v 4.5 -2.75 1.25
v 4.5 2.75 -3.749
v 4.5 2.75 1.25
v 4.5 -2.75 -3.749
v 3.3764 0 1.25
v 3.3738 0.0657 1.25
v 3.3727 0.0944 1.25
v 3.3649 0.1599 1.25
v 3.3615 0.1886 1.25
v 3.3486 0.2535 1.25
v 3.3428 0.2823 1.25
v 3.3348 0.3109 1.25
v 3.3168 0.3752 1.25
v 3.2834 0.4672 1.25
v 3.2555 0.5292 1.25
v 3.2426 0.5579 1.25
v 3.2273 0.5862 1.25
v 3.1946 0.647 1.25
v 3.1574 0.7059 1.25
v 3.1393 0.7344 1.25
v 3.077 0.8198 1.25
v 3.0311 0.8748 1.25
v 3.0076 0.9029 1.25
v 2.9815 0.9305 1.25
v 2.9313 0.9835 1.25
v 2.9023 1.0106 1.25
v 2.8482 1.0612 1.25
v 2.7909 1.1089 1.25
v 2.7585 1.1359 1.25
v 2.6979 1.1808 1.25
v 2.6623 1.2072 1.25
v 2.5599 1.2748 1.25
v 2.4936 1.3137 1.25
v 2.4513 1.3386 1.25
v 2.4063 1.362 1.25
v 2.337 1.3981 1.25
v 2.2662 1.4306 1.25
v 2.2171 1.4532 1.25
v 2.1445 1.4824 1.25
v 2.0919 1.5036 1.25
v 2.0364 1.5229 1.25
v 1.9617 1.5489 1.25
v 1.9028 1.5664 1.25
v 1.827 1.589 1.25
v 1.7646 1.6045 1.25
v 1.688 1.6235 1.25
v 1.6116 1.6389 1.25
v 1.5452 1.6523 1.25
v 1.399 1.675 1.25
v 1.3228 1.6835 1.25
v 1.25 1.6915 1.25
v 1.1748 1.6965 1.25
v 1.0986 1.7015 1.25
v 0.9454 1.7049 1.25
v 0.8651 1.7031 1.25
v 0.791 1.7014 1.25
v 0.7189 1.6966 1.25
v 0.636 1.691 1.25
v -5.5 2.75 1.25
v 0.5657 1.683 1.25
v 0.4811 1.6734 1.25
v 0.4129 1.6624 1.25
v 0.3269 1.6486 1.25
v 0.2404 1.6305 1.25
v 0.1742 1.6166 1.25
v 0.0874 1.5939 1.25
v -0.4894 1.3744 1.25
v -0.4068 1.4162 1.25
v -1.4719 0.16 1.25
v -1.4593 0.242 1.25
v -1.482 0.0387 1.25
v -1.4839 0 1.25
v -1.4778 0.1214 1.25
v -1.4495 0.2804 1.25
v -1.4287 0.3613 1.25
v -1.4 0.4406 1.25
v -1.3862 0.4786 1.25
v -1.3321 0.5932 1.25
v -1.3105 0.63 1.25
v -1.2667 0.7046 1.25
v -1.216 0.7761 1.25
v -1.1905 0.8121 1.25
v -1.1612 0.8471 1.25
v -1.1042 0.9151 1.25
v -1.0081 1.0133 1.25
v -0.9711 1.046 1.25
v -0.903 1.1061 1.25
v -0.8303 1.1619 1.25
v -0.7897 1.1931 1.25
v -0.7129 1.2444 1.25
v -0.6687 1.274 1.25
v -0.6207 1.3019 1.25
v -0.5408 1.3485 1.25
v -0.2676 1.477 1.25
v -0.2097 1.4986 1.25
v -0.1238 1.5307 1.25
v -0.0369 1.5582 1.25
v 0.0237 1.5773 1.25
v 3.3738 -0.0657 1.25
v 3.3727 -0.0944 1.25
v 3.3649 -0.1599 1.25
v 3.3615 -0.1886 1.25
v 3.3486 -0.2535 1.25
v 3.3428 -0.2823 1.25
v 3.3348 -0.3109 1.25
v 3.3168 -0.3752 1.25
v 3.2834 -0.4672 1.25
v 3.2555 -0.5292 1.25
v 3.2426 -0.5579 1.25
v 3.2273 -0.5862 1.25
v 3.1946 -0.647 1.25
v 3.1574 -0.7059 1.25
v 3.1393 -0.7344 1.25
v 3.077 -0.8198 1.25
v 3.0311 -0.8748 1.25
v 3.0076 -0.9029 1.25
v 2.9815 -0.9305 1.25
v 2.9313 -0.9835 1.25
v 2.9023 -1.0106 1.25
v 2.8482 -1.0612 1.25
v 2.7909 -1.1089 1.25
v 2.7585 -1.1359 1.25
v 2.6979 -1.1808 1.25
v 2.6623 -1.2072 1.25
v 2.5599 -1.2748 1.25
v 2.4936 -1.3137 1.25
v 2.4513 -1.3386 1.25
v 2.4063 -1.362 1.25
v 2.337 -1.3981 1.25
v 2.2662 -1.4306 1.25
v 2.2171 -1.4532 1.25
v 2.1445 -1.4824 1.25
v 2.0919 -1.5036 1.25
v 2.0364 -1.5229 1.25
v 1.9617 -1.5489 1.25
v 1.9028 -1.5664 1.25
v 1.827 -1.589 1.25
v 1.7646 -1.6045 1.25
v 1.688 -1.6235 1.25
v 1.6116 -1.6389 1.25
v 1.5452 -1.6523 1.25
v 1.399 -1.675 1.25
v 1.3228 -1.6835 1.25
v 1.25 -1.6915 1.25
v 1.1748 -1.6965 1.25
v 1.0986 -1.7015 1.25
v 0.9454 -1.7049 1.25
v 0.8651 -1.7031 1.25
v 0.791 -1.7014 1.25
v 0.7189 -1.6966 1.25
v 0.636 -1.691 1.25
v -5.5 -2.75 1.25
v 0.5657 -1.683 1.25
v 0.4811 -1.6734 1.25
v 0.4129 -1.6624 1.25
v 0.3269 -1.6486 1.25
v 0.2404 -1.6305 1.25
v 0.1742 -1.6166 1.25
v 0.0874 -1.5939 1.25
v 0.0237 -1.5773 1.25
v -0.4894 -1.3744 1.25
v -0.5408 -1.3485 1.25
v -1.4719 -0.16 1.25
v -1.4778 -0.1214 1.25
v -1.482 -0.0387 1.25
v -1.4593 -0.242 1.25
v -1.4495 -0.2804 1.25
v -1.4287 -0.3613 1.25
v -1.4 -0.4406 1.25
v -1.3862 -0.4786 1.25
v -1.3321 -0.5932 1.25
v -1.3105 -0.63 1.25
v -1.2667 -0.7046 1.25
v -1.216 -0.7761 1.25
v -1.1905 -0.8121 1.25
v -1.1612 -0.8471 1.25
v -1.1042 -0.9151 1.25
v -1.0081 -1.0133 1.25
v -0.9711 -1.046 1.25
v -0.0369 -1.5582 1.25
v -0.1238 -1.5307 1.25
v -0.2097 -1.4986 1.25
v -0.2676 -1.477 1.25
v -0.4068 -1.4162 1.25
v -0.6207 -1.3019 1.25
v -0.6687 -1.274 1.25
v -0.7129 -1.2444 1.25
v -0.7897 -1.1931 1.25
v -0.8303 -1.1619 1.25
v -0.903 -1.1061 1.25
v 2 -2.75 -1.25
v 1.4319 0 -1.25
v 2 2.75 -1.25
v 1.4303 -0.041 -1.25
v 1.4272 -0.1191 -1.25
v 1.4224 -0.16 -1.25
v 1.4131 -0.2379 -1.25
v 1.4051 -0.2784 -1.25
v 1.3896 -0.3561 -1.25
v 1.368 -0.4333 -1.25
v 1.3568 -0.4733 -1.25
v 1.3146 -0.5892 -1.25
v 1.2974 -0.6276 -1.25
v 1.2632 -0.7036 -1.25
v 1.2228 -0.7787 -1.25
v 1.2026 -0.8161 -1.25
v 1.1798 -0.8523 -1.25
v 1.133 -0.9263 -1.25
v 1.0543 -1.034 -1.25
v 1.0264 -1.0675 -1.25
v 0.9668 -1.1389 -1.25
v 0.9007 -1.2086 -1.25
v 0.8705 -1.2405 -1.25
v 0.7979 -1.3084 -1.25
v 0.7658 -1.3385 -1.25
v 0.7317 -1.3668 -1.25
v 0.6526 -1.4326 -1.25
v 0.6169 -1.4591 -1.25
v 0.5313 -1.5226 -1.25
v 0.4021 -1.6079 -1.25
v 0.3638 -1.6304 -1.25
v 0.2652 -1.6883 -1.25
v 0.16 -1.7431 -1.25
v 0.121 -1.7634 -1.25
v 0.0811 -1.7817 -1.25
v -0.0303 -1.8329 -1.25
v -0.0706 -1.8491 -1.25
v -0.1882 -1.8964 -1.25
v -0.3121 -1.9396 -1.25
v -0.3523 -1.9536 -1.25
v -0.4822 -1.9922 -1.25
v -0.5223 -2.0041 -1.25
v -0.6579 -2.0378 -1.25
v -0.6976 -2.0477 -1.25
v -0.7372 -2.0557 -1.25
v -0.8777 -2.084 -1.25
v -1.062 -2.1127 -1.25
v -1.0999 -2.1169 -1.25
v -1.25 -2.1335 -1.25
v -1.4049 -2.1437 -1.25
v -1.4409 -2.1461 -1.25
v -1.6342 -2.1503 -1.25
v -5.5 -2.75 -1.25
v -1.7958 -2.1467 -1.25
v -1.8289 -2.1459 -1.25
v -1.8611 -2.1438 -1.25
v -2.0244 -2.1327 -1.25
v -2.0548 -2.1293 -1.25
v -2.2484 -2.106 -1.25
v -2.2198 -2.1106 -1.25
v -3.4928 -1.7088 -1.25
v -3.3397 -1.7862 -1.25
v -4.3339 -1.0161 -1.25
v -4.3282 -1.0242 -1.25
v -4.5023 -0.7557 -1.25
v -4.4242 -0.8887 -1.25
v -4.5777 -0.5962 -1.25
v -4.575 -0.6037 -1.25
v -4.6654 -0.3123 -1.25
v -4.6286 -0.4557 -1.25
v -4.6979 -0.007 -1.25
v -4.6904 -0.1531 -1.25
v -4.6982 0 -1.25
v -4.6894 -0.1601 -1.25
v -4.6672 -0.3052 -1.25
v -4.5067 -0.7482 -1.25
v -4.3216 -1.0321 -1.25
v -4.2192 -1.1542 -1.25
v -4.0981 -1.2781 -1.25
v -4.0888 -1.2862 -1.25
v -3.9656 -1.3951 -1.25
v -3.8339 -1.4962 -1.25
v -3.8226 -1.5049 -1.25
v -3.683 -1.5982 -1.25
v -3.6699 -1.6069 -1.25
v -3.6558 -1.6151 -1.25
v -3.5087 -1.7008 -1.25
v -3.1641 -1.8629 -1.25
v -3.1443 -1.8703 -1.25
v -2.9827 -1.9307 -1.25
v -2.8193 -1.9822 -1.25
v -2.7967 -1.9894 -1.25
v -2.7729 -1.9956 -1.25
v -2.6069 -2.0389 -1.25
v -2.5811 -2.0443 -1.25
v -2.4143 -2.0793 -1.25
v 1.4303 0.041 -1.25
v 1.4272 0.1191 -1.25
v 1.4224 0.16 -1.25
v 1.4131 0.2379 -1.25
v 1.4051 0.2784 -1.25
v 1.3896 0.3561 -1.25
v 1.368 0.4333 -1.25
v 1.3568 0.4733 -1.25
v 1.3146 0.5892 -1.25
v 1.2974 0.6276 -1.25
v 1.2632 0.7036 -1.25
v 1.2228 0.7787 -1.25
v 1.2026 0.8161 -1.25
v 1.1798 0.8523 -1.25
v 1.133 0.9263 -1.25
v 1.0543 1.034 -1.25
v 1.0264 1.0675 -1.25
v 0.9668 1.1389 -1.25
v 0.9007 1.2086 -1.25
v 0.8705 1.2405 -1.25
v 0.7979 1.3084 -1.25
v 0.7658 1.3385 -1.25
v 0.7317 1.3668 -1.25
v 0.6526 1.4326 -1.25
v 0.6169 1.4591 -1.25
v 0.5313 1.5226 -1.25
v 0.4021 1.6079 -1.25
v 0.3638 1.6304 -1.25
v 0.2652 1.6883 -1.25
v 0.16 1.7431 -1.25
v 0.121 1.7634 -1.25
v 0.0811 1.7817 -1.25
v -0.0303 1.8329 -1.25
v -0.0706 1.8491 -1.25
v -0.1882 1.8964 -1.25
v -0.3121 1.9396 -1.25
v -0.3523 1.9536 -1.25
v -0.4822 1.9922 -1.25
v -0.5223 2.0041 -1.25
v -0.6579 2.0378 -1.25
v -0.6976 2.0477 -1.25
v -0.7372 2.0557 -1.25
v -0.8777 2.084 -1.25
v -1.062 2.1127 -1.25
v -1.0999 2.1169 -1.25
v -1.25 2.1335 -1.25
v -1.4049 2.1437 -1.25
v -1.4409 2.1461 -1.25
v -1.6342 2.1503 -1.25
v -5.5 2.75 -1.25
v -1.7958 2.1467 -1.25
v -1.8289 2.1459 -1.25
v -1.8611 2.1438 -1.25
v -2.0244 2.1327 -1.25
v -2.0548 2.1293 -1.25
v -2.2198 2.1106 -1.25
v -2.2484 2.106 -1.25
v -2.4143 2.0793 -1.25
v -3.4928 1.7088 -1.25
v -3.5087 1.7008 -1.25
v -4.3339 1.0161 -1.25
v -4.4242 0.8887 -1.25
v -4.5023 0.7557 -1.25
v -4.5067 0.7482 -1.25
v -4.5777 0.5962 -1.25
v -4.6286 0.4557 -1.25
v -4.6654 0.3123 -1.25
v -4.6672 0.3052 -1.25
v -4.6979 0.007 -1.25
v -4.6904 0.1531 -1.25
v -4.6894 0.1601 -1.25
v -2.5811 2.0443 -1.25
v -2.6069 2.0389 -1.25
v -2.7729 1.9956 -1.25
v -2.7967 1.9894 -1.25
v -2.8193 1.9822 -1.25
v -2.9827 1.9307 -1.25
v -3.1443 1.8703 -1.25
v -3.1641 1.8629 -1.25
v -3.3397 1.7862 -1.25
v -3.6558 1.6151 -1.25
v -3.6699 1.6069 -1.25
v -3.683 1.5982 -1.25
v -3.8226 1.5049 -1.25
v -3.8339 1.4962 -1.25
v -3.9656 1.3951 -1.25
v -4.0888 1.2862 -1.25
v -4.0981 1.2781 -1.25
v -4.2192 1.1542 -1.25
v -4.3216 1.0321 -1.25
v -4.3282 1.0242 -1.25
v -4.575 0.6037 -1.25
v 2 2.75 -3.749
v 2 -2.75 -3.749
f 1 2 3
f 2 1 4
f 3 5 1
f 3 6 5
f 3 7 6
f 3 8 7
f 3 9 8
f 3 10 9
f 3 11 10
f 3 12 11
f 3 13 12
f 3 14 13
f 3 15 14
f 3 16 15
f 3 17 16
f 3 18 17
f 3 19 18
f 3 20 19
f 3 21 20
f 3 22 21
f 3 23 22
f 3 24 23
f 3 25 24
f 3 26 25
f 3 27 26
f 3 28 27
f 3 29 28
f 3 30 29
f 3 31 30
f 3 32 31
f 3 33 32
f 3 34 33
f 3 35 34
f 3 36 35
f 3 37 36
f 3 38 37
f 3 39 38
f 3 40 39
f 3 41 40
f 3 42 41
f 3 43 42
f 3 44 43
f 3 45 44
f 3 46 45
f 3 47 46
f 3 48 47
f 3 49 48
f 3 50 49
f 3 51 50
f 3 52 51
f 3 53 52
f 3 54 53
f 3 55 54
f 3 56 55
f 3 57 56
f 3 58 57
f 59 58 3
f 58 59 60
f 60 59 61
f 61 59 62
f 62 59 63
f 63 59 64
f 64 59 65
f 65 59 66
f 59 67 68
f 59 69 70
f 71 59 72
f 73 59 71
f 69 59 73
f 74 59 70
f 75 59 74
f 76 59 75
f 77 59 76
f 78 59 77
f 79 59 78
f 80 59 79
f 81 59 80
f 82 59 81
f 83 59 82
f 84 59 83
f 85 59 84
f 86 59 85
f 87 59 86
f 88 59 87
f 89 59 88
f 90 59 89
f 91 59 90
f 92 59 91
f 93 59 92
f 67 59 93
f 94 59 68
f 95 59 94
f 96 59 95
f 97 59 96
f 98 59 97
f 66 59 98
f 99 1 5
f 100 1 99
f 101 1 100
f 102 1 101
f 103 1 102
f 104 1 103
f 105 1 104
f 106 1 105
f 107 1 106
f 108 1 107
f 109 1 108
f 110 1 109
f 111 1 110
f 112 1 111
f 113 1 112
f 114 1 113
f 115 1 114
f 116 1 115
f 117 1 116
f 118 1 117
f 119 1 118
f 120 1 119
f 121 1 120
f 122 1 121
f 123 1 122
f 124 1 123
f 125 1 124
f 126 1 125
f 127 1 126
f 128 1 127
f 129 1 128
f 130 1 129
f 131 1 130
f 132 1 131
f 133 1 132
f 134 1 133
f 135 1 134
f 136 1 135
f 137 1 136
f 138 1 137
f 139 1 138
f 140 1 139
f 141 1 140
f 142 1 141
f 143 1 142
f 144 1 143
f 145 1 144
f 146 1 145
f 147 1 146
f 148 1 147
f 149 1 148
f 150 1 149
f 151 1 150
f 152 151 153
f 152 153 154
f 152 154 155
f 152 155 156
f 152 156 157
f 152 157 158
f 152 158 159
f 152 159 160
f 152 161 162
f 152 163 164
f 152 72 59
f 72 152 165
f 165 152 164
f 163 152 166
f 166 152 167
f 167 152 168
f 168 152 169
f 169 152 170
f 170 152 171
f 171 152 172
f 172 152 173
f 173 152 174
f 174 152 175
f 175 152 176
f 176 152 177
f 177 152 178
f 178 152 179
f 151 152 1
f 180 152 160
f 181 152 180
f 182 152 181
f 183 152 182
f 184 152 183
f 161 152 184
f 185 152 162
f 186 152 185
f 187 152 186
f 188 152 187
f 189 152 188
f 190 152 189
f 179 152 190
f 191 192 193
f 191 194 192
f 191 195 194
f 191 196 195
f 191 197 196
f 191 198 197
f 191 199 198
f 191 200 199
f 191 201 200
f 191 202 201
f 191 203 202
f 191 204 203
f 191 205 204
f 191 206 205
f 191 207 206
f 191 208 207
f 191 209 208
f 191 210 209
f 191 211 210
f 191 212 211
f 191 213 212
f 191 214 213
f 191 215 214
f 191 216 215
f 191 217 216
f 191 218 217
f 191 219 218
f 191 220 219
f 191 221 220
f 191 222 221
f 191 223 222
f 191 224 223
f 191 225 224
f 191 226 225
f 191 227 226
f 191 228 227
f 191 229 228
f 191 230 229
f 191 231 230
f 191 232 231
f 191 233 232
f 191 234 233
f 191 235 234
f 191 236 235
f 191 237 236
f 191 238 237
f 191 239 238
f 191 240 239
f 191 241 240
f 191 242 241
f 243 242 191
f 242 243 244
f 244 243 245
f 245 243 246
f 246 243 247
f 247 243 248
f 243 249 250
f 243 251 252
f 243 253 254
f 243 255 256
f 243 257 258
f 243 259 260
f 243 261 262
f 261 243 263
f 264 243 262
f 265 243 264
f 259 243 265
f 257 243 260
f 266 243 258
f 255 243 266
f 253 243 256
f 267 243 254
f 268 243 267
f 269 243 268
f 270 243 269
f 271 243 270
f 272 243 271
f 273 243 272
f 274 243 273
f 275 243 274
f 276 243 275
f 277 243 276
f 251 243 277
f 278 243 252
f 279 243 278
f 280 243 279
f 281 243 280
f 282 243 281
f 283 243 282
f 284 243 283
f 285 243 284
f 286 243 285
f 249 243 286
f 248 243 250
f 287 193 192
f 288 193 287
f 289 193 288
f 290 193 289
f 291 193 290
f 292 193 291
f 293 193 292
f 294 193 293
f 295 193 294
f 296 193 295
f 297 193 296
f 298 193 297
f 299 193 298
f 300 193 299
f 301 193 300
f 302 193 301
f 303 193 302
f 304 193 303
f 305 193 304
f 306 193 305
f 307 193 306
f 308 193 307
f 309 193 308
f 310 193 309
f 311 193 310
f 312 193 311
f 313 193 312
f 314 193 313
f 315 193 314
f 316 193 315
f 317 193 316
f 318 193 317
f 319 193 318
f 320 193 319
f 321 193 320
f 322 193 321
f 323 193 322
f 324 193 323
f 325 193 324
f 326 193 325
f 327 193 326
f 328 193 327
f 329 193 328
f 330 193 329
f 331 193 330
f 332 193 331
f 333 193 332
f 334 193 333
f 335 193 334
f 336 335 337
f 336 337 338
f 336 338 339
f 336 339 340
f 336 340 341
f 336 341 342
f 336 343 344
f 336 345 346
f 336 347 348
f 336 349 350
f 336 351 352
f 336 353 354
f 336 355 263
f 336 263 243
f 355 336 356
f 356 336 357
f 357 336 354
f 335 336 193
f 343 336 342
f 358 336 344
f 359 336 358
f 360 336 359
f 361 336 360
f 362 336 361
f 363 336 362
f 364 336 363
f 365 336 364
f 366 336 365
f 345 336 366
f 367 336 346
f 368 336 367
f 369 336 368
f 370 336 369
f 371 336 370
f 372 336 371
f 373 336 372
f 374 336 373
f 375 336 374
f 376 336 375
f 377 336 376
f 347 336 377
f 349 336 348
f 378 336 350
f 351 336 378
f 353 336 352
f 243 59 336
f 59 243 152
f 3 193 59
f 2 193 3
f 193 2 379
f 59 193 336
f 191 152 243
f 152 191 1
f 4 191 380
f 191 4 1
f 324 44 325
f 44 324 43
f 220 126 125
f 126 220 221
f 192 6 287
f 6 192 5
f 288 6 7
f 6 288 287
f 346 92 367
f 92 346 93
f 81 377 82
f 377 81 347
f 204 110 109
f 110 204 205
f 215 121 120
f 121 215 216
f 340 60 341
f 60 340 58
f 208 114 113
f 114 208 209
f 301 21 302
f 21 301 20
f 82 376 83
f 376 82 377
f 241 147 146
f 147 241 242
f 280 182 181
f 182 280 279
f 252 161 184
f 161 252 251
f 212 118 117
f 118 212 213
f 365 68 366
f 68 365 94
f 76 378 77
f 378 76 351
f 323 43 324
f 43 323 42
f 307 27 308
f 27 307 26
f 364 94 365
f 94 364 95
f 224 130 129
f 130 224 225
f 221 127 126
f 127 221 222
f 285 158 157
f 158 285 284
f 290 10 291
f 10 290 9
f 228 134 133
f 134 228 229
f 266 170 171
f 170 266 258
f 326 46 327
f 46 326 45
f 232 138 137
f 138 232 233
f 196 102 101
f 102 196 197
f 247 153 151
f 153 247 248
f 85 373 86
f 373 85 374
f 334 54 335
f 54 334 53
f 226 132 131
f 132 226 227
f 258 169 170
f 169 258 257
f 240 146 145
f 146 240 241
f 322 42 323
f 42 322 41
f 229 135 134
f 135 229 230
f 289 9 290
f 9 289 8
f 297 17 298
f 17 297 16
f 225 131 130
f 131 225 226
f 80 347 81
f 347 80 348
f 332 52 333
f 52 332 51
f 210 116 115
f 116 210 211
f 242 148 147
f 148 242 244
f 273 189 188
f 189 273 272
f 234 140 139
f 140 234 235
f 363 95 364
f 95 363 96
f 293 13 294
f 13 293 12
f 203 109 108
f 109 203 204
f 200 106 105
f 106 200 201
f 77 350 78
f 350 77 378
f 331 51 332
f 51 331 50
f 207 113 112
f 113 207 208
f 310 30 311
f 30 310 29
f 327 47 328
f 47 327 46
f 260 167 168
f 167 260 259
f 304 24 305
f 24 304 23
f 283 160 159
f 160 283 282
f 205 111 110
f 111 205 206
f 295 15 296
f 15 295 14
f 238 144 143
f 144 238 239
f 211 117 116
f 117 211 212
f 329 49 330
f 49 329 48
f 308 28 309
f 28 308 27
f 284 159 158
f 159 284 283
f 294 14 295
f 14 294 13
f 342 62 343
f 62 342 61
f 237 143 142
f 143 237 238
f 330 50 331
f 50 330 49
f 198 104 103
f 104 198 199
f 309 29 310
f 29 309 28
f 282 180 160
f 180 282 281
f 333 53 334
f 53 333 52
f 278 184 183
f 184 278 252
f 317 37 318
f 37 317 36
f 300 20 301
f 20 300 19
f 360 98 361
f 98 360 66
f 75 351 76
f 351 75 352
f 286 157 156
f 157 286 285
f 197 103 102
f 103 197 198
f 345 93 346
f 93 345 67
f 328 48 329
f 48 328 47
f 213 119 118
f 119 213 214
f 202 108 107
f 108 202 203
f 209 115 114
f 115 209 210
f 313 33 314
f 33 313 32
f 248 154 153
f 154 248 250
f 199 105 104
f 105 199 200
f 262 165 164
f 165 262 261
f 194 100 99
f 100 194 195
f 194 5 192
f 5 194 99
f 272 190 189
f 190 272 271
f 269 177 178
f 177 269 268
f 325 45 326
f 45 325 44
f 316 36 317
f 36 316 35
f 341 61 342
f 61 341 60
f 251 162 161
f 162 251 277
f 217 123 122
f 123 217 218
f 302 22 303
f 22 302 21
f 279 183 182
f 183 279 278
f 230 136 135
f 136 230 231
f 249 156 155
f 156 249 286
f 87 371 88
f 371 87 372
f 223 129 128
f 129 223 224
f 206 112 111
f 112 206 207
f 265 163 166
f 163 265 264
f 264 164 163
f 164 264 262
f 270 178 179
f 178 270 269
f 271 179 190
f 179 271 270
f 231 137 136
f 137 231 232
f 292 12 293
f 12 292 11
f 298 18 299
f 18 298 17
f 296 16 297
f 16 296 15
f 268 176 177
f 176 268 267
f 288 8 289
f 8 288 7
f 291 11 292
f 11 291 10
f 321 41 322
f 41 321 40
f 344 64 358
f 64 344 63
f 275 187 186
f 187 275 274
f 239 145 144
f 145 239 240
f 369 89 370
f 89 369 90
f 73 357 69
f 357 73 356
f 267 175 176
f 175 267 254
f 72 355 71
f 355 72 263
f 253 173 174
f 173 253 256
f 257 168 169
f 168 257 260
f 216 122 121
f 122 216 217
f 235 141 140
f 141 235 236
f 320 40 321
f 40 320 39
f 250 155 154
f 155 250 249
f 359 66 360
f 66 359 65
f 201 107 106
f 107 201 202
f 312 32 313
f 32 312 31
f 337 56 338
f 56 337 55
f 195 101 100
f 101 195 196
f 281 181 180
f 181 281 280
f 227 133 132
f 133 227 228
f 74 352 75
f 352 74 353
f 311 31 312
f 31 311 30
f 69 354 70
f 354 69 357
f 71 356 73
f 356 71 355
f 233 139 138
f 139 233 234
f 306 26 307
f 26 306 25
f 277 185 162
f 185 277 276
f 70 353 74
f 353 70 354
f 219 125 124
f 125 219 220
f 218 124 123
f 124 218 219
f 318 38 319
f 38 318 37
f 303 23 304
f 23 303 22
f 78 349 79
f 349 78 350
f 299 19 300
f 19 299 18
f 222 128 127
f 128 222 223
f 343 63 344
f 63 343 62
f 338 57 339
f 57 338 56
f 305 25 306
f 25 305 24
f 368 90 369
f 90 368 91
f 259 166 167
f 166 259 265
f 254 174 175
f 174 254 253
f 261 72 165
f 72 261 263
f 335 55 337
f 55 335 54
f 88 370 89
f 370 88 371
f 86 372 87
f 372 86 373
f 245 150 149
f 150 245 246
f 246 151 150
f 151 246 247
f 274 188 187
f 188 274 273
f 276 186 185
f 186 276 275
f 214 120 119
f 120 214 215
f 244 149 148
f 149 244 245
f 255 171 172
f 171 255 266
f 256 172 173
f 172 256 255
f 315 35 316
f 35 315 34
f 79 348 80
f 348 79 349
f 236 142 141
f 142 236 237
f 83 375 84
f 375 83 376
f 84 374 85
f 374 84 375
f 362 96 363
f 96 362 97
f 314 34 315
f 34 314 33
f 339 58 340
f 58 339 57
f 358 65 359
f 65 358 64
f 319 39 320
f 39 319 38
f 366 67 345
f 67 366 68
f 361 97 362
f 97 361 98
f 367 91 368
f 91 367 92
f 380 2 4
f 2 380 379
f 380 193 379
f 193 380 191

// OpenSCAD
// file: utils.scad
//-- General parts
//-- Ariel Burman
//-- Moorman Lab, University of Massachusetts Amherst
//-- v1.2 - April 2021


module screwM3(length,show=false){
  translate([0,0,-length-.005])cylinder(h=length+.1+.005,d=3.4,$fn=64);
  cylinder(h=3,d=5.5,$fn=64);
  if (show==true) {
    %translate([0,0,-length])cylinder(h=length,d=3.2,$fn=64);
    %cylinder(h=3,d=5.5,$fn=64);
    echo(str("M3 screw lenght: ", length, " mm"));
  }
}

module nutM3(rotation=0,show=false) {
  rotate([0,0,rotation])cylinder(h=2.6+.01,d=6.5,$fn=6,center=true);
  if (show==true) {
    %difference(){
      rotate([0,0,rotation])cylinder(h=2.6,d=6.4,$fn=6,center=true);
      cylinder(h=3,d=3.5,$fn=64,center=true);
    }
  }
}

module torus(d1,d2,fn=64){
  assert (d1<=d2, str("ERROR d1 must not be greater than d2. d1 = ",d1,"| d2 = ",d2));
  rotate_extrude(convexity = 10,$fn=fn)
  translate([d2/2, 0, 0])
  circle(d=d1, $fn=fn);
}


module rrect(size,center=false,fn=64){

  dx = size[0];
  dy = size[1];
  dz = size[2];
  
  module _rrect(size,fn){
    d = min(dx,dy);
    a = (d == dx ? 0 : 1);
    
    hull()
      for(i=[-1,1]) 
        translate([a*i*(dx-d)/2,(1-a)*i*(dy-d)/2,0])
             cylinder(h=dz,d=d,$fn=fn,center=true);
  }
  
  if (center==true)
    _rrect(size,fn);
  else
    translate([dx/2,dy/2,dz/2]) _rrect(size,fn);
  
}  

module r2cube(size,center=false,r=0,fn=64){

  module _r2cube(size,r,fn){
    
    hull()
      for(i=[-1,1]) 
        translate([i*(dx/2-r),0,0])
          rrect([2*r,dy,dz],$fn=fn,center=true);

//    hull(){
//      for(i=[-1,1]) 
//        translate([i*(dx/2-r),0,0])
//          hull(){
//            for(j=[-1,1])
//              translate([0,j*(dy/2-r),0])
//                cylinder(h=dz,r=r,$fn=fn,center=true);
//          }
//    }

//    hull()
//      for(i=[-1,1]) 
//        for(j=[-1,1])
//          translate([i*(dx/2-r),j*(dy/2-r),0])
//            cylinder(h=dz,r=r,$fn=fn,center=true);
    
  }

  dx = size[0];
  dy = size[1];
  dz = size[2];

  assert(r>0,"Corner radius must be grater than 0 (otherwise just use cube)");
  assert(r<=min(dx,dy)/2,"Corner radius must not be greater than min(x,y)/2");

  if (center==true)
    _r2cube(size,r,fn);
  else
    translate([dx/2,dy/2,dz/2]) _r2cube(size,r,fn);
}


module rcylinder(h,r,rb,center=false,fn=64){
  module _rcylinder(h,r,rb,fn){
    hull(){
      translate([0,0,-h/2+rb/2])torus(rb,2*r-rb,fn);
      translate([0,0,h/2-rb/2])torus(rb,2*r-rb,fn);
    }
  }
  if (center==true)
    _rcylinder(h,r,rb,fn);
  else
    translate([0,0,h/2])_rcylinder(h,r,rb,fn);
}

module rhcylinder(h,rout,rin,rb,center=false,fn=64){
  //rounded hollow cylinder
  module _rhcylinder(h,rout,rin,rb,fn){
    difference(){
      union(){
      cylinder(h=h,d=2*rout-rb,$fn=fn,center=true);
      cylinder(h=h-rb,d=2*rout,$fn=fn,center=true);
      }
      cylinder(h=h-rb,d=2*rin,$fn=fn,center=true);
      translate([0,0,h/2])cylinder(h=rb+.1,d=2*rin+rb,$fn=fn,center=true);
      translate([0,0,-h/2])cylinder(h=rb+.1,d=2*rin+rb,$fn=fn,center=true);
    }
    translate([0,0,-h/2+rb/2])torus(rb,2*rout-rb,fn);
    translate([0,0,h/2-rb/2])torus(rb,2*rout-rb,fn);
    translate([0,0,-h/2+rb/2])torus(rb,2*rin+rb,fn);
    translate([0,0,h/2-rb/2])torus(rb,2*rin+rb,fn);
  }
  
  //do assertions
  assert(rout>rin);
  assert(rb<=(rout-rin));
  assert(h>=rb);

  if (center==true)
    _rhcylinder(h,rout,rin,rb,fn);
  else
    translate([0,0,h/2])_rhcylinder(h,rout,rin,rb,fn);
}

module r3cube(size,center=true,rc=0,rb=0,fn=32){
  
  
  module _r3cube(size,r,fn){
//    hull(){
//      for(i=[-1,1]) 
//        for(j=[-1,1])
//          for(k=[-1,1])
//          translate([i*(dx/2-r),j*(dy/2-r),k*(dz/2-r)]) sphere(r=r,$fn=32);
//    }

     hull(){
      for(k=[-1,1]) translate([0,0,k*(dz/2-r)])
        hull(){
          for(j=[-1,1])translate([0,j*(dy/2-r),0])
            hull(){
              for(i=[-1,1])
                translate([i*(dx/2-r),0,0]) sphere(r=r,$fn=fn);
            }
        }
     }

  }

  module _r3cube(size,r,fn){
//    hull(){
//      for(i=[-1,1]) 
//        for(j=[-1,1])
//          for(k=[-1,1])
//          translate([i*(dx/2-r),j*(dy/2-r),k*(dz/2-r)]) sphere(r=r,$fn=32);
//    }

     hull(){
      for(k=[-1,1]) translate([0,0,k*(dz/2-r)])
        hull(){
          for(j=[-1,1])translate([0,j*(dy/2-r),0])
            hull(){
              for(i=[-1,1])
                translate([i*(dx/2-r),0,0]) sphere(r=r,$fn=fn);
            }
        }
     }

  }
  

  
  dx = size[0];
  dy = size[1];
  dz = size[2];
  assert (rc>0,"Missing radius value rc");
  if (rb==0){
    //same radius for all corners and edges;
    assert (rc<=min(dx,dy,dz)/2,"Corner radius must not be greater than min(x,y,z)/2");
    
    if (center==true)
      _r3cube(size,rc,fn);
    else
      translate([dx/2,dy/2,dz/2]);
  }
  else {
  //assert (rb>0,"Missing radius value rb");
    assert (rc<=min(dx,dy)/2,"Corner radius must not be greater than min(x,y)/2");
    assert (rb<dz/2,"Border radius must not be greater than z/2");

    if (center==true)
      _r3bcube(size,rc,fn);
    else
      translate([dx/2,dy/2,dz/2]);
  }
}



*difference(){
  cube(12,center=true);
  translate([0,0,5])screwM3(11,show=true);
  translate([0,0,-4.7])nutM3(rotation=0,show=true);
}
//translate([10,10,0])
*torus(1,20-1,64);

*rrect([10,5,2],center=false,fn=1024);
r2cube([15,20,2],r=7.5,fn=64,center=false);
*r3cube([20,15,5],rc=2);
*rcylinder(h=10,r=10,rb=4,center=false,fn=64);
*rhcylinder(h=15,rout=14,rin=8,rb=2,center=true,fn=128);
// main file
//-- Hose adapter
//-- Ariel Burman 
//-- Moorman Lab, University of Massachusetts Amherst
//-- v1.0 - April 2021

use <utils.scad>;

LB = 10;
LS = 7;
outDB = 5;
outDS = 3.3;
inDB = 3.5;
inDS = 1.9;

module hoseSizeAdaptor(){
  difference(){
    union(){
      cylinder(h=LB-1,d=outDB,$fn=100);
      torus(d1=(outDB-inDB)/2,d2=(outDB+inDB)/2);
      translate([0,0,LB-1-.001])cylinder(h=2+.002,d1=outDB,d2=outDS,$fn=100);
      translate([0,0,LB+1-.1])cylinder(h=LS-1+.1,d=outDS,$fn=100);
      translate([0,0,LB+LS])torus(d1=(outDS-inDS)/2,d2=(outDS+inDS)/2);
    }
    union(){
      translate([0,0,-.1])cylinder(h=LB-1+.102,d=inDB,$fn=100);
      translate([0,0,LB-1-.001])cylinder(h=2+.002,d1=inDB,d2=inDS,$fn=100);
      translate([0,0,LB+1-.001])cylinder(h=LS-1+.102,d=inDS,$fn=100);
    }
  }
}

module lickport(hS,hB,inD) {
  outD = inD + 1.5;
  hD = 3;
  difference(){
    union(){
      torus(d1=(hD-inD)/2,d2=(hD+inD)/2);
      // hose connection
      cylinder(h=hS,d=hD,$fn=100);
      translate([0,0,hS-.01])cylinder(h=hB+.01,d1=2*outD,d2=outD,$fn=100);
      translate([0,0,hS+hB-.01])torus(d1=(outD-inD)/2,d2=(outD+inD)/2);
    }
    translate([0,0,-.05])cylinder(h=hS+hB+.1,d=inD,$fn=100);
  }      
}

module lickportHolder(a,b,c){
  d = c + 1.5;
  difference(){
    translate([-.5,0,0])cube([4*d,2.2*d,d],center=true);
    scale([1.02,1.02,1.02])
    rotate([0,45,0])cylinder(h=b,d1=2*d,d2=d,$fn=100,center=true);
    %rotate([0,45,0])cylinder(h=b,d1=2*d,d2=d,$fn=100,center=true);
  }
  translate([1.5*d-.5,0,-d+.001])cube([d,2.2*d,d],center=true);
}

//lickport(4,10,1);
lickportHolder(4,10,1);
